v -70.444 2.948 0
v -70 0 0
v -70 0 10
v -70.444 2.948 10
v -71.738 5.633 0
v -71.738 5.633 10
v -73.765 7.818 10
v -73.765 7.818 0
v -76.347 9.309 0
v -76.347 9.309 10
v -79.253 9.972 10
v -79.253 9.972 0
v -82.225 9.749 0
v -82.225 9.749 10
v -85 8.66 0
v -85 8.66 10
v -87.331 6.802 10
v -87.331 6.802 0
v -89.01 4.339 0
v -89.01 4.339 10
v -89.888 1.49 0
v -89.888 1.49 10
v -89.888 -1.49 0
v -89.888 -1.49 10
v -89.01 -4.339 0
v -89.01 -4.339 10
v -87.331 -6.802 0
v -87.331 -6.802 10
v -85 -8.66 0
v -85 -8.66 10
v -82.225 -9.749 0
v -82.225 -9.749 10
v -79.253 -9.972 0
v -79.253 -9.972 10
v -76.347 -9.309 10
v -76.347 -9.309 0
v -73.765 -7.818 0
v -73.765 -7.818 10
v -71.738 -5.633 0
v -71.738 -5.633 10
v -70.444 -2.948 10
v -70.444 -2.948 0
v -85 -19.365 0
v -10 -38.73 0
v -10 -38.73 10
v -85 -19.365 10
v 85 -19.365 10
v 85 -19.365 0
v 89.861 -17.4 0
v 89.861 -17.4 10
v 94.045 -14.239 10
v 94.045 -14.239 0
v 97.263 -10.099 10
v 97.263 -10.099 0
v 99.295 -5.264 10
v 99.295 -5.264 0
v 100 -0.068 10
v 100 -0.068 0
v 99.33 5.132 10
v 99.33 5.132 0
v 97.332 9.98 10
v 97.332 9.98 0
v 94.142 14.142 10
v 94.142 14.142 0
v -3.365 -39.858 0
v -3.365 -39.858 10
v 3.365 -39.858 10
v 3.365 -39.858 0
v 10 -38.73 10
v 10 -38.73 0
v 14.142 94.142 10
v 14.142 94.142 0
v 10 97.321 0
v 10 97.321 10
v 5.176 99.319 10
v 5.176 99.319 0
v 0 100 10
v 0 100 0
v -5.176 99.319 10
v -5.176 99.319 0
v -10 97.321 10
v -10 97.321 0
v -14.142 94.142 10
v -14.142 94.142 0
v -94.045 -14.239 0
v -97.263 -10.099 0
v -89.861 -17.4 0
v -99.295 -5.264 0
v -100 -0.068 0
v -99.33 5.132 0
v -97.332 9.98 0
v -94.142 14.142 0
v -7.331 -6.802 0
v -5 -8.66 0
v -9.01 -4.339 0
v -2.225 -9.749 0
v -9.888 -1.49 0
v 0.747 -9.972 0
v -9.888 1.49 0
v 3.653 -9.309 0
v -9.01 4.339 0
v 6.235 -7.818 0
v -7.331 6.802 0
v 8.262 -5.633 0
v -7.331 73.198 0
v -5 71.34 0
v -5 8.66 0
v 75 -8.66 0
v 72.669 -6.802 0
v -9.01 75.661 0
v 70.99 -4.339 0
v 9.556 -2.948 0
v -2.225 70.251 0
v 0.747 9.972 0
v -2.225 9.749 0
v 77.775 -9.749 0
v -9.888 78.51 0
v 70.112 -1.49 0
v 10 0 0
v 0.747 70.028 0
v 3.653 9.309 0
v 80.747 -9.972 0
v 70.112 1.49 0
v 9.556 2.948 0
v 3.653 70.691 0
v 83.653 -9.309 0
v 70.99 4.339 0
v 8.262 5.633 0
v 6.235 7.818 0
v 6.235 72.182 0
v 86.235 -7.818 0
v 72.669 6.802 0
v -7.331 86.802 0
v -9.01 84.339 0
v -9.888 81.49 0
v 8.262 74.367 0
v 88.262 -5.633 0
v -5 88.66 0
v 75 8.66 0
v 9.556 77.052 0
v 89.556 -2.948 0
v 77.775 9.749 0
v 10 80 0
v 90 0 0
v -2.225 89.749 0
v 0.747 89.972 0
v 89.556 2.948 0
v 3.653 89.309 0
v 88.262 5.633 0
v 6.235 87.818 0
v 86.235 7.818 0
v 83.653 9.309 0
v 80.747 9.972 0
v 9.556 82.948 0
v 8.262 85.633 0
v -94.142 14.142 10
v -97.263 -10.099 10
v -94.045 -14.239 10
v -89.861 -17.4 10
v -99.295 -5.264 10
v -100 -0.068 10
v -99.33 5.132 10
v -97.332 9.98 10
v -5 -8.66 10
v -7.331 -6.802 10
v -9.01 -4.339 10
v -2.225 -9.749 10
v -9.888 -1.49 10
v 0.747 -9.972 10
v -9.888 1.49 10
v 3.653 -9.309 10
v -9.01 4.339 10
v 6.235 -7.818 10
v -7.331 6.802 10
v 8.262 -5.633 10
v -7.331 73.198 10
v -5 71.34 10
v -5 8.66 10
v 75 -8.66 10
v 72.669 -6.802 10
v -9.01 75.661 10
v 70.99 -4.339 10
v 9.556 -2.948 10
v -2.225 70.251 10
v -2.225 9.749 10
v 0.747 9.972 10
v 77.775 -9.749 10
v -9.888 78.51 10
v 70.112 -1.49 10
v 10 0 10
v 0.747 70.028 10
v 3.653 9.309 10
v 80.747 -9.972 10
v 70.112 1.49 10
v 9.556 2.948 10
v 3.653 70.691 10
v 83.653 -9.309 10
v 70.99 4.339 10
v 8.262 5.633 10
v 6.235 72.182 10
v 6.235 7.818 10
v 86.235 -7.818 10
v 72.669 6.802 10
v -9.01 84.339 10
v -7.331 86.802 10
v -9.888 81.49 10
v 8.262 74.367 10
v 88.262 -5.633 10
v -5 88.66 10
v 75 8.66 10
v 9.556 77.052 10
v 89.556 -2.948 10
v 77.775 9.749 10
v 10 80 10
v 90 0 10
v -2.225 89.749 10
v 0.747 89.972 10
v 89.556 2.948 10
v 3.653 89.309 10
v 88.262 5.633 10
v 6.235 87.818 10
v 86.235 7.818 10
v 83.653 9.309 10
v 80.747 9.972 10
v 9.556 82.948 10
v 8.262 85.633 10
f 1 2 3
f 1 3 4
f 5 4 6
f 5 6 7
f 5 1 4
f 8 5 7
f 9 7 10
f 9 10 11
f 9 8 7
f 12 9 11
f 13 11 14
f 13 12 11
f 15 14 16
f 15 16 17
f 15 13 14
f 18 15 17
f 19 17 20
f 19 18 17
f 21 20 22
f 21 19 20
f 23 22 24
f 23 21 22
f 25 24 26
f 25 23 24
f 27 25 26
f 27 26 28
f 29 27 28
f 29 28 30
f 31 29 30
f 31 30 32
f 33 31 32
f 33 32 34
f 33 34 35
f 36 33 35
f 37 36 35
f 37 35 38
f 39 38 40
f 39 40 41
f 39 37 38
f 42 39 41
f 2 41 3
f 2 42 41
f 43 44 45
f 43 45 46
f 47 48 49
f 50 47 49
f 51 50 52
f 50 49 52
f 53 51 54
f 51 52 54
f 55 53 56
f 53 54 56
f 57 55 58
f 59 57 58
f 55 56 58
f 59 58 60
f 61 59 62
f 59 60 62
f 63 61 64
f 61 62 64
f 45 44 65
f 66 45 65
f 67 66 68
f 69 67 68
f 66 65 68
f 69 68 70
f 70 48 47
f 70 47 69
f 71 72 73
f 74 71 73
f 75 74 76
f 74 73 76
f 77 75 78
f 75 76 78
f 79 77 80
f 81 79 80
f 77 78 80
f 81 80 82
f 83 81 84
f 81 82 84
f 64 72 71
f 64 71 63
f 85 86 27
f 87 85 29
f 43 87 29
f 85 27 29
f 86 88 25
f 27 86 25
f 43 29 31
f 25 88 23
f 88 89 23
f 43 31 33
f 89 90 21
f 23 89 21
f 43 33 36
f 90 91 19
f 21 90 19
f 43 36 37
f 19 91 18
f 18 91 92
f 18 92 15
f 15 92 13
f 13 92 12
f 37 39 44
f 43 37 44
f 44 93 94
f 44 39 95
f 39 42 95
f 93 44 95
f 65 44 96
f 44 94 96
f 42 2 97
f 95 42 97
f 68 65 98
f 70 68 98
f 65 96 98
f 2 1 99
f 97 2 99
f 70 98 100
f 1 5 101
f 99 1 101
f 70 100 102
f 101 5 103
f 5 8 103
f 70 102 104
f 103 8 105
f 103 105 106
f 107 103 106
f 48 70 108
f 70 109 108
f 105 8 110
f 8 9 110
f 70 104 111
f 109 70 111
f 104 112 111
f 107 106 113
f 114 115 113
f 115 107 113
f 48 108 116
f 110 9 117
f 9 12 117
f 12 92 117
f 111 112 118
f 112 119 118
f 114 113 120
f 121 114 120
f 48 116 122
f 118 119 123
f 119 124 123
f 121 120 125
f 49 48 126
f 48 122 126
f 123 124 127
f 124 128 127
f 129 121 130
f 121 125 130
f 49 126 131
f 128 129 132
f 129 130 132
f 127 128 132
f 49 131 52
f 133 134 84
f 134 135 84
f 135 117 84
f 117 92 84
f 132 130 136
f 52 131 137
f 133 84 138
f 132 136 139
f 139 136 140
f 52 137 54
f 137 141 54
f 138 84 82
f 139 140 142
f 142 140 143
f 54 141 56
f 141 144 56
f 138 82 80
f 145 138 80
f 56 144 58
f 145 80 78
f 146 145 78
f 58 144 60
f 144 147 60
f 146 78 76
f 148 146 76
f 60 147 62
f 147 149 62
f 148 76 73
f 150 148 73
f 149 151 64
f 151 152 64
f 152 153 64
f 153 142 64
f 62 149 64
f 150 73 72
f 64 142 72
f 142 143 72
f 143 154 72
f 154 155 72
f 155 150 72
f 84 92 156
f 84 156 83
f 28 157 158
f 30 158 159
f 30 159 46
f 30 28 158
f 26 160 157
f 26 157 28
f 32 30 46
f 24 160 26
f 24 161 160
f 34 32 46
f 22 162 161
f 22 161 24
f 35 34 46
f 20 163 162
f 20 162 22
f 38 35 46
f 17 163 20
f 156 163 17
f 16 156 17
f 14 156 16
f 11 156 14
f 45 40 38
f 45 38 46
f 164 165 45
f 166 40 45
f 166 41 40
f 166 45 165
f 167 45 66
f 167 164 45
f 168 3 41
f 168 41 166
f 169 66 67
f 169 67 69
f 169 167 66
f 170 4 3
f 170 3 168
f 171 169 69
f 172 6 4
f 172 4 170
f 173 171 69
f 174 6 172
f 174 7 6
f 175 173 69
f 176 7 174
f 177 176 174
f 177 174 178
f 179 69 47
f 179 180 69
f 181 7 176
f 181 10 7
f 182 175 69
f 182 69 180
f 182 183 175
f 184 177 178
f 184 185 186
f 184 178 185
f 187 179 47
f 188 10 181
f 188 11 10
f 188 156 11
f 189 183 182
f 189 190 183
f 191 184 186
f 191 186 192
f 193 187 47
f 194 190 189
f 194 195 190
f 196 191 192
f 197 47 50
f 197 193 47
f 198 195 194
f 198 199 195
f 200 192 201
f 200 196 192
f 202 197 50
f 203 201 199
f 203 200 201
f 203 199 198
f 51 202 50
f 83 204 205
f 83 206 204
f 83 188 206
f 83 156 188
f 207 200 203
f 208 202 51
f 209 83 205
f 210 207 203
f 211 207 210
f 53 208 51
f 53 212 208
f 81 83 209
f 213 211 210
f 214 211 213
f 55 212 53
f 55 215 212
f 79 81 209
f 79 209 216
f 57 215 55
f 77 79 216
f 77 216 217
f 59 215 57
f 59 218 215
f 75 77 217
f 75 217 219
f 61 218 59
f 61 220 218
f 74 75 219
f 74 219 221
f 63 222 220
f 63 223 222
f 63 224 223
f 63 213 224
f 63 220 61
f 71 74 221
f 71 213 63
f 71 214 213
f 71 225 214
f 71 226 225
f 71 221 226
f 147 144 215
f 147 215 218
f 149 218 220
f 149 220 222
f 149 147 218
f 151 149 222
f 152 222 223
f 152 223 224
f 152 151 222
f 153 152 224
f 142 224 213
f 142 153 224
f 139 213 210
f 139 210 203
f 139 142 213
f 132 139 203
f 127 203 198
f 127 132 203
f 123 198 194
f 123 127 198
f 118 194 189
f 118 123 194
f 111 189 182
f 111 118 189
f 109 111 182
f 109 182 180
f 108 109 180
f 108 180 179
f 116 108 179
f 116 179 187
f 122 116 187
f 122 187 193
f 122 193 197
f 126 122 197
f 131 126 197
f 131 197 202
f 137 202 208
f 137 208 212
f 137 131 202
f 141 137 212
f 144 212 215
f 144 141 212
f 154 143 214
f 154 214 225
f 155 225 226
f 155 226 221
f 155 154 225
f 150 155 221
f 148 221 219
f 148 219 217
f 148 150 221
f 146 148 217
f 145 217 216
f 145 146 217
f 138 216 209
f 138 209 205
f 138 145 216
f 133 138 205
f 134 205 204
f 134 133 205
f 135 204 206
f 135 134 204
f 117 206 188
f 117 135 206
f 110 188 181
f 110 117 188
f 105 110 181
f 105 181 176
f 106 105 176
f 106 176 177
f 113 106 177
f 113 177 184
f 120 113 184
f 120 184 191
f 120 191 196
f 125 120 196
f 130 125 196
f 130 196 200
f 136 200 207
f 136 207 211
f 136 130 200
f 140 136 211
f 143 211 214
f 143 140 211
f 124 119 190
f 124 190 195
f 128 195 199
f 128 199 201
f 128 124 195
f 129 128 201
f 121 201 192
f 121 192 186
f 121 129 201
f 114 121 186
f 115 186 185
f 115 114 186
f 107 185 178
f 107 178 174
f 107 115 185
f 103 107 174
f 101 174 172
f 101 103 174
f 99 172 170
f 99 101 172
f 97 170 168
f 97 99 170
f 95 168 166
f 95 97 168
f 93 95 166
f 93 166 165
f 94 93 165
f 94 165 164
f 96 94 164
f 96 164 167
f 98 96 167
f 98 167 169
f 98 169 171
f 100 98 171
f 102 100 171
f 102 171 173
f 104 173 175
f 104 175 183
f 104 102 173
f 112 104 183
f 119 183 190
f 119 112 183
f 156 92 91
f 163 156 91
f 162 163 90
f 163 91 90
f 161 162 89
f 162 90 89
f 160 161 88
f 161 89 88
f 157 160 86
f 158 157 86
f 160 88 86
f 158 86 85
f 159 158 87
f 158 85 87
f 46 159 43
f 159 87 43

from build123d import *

# Parameters (mm, degrees)
SKETCH_R      = 10
EXTRUDE_DEPTH = 10


with BuildPart() as part:
    # Sketch → Extrude (new body)
    with BuildSketch(Plane.XY):
        with BuildLine():
            ThreePointArc((-10, -38.729833), (0, -40), (10, -38.729833))
            Line((85, -19.364917), (10, -38.729833))
            ThreePointArc((85, -19.364917), (99.294714, -5.264411), (94.142136, 14.142136))
            Line((14.142136, 94.142136), (94.142136, 14.142136))
            ThreePointArc((14.142136, 94.142136), (0, 100), (-14.142136, 94.142136))
            Line((-94.142136, 14.142136), (-14.142136, 94.142136))
            ThreePointArc((-94.142136, 14.142136), (-99.294714, -5.264411), (-85, -19.364917))
            Line((-10, -38.729833), (-85, -19.364917))
        make_face()
        Circle(SKETCH_R, mode=Mode.SUBTRACT)
        with Locations((-80, 0)):
            Circle(SKETCH_R, mode=Mode.SUBTRACT)
        with Locations((80, 0)):
            Circle(SKETCH_R, mode=Mode.SUBTRACT)
        with Locations((0, 80)):
            Circle(SKETCH_R, mode=Mode.SUBTRACT)
    extrude(amount=EXTRUDE_DEPTH)


solid = part.part
